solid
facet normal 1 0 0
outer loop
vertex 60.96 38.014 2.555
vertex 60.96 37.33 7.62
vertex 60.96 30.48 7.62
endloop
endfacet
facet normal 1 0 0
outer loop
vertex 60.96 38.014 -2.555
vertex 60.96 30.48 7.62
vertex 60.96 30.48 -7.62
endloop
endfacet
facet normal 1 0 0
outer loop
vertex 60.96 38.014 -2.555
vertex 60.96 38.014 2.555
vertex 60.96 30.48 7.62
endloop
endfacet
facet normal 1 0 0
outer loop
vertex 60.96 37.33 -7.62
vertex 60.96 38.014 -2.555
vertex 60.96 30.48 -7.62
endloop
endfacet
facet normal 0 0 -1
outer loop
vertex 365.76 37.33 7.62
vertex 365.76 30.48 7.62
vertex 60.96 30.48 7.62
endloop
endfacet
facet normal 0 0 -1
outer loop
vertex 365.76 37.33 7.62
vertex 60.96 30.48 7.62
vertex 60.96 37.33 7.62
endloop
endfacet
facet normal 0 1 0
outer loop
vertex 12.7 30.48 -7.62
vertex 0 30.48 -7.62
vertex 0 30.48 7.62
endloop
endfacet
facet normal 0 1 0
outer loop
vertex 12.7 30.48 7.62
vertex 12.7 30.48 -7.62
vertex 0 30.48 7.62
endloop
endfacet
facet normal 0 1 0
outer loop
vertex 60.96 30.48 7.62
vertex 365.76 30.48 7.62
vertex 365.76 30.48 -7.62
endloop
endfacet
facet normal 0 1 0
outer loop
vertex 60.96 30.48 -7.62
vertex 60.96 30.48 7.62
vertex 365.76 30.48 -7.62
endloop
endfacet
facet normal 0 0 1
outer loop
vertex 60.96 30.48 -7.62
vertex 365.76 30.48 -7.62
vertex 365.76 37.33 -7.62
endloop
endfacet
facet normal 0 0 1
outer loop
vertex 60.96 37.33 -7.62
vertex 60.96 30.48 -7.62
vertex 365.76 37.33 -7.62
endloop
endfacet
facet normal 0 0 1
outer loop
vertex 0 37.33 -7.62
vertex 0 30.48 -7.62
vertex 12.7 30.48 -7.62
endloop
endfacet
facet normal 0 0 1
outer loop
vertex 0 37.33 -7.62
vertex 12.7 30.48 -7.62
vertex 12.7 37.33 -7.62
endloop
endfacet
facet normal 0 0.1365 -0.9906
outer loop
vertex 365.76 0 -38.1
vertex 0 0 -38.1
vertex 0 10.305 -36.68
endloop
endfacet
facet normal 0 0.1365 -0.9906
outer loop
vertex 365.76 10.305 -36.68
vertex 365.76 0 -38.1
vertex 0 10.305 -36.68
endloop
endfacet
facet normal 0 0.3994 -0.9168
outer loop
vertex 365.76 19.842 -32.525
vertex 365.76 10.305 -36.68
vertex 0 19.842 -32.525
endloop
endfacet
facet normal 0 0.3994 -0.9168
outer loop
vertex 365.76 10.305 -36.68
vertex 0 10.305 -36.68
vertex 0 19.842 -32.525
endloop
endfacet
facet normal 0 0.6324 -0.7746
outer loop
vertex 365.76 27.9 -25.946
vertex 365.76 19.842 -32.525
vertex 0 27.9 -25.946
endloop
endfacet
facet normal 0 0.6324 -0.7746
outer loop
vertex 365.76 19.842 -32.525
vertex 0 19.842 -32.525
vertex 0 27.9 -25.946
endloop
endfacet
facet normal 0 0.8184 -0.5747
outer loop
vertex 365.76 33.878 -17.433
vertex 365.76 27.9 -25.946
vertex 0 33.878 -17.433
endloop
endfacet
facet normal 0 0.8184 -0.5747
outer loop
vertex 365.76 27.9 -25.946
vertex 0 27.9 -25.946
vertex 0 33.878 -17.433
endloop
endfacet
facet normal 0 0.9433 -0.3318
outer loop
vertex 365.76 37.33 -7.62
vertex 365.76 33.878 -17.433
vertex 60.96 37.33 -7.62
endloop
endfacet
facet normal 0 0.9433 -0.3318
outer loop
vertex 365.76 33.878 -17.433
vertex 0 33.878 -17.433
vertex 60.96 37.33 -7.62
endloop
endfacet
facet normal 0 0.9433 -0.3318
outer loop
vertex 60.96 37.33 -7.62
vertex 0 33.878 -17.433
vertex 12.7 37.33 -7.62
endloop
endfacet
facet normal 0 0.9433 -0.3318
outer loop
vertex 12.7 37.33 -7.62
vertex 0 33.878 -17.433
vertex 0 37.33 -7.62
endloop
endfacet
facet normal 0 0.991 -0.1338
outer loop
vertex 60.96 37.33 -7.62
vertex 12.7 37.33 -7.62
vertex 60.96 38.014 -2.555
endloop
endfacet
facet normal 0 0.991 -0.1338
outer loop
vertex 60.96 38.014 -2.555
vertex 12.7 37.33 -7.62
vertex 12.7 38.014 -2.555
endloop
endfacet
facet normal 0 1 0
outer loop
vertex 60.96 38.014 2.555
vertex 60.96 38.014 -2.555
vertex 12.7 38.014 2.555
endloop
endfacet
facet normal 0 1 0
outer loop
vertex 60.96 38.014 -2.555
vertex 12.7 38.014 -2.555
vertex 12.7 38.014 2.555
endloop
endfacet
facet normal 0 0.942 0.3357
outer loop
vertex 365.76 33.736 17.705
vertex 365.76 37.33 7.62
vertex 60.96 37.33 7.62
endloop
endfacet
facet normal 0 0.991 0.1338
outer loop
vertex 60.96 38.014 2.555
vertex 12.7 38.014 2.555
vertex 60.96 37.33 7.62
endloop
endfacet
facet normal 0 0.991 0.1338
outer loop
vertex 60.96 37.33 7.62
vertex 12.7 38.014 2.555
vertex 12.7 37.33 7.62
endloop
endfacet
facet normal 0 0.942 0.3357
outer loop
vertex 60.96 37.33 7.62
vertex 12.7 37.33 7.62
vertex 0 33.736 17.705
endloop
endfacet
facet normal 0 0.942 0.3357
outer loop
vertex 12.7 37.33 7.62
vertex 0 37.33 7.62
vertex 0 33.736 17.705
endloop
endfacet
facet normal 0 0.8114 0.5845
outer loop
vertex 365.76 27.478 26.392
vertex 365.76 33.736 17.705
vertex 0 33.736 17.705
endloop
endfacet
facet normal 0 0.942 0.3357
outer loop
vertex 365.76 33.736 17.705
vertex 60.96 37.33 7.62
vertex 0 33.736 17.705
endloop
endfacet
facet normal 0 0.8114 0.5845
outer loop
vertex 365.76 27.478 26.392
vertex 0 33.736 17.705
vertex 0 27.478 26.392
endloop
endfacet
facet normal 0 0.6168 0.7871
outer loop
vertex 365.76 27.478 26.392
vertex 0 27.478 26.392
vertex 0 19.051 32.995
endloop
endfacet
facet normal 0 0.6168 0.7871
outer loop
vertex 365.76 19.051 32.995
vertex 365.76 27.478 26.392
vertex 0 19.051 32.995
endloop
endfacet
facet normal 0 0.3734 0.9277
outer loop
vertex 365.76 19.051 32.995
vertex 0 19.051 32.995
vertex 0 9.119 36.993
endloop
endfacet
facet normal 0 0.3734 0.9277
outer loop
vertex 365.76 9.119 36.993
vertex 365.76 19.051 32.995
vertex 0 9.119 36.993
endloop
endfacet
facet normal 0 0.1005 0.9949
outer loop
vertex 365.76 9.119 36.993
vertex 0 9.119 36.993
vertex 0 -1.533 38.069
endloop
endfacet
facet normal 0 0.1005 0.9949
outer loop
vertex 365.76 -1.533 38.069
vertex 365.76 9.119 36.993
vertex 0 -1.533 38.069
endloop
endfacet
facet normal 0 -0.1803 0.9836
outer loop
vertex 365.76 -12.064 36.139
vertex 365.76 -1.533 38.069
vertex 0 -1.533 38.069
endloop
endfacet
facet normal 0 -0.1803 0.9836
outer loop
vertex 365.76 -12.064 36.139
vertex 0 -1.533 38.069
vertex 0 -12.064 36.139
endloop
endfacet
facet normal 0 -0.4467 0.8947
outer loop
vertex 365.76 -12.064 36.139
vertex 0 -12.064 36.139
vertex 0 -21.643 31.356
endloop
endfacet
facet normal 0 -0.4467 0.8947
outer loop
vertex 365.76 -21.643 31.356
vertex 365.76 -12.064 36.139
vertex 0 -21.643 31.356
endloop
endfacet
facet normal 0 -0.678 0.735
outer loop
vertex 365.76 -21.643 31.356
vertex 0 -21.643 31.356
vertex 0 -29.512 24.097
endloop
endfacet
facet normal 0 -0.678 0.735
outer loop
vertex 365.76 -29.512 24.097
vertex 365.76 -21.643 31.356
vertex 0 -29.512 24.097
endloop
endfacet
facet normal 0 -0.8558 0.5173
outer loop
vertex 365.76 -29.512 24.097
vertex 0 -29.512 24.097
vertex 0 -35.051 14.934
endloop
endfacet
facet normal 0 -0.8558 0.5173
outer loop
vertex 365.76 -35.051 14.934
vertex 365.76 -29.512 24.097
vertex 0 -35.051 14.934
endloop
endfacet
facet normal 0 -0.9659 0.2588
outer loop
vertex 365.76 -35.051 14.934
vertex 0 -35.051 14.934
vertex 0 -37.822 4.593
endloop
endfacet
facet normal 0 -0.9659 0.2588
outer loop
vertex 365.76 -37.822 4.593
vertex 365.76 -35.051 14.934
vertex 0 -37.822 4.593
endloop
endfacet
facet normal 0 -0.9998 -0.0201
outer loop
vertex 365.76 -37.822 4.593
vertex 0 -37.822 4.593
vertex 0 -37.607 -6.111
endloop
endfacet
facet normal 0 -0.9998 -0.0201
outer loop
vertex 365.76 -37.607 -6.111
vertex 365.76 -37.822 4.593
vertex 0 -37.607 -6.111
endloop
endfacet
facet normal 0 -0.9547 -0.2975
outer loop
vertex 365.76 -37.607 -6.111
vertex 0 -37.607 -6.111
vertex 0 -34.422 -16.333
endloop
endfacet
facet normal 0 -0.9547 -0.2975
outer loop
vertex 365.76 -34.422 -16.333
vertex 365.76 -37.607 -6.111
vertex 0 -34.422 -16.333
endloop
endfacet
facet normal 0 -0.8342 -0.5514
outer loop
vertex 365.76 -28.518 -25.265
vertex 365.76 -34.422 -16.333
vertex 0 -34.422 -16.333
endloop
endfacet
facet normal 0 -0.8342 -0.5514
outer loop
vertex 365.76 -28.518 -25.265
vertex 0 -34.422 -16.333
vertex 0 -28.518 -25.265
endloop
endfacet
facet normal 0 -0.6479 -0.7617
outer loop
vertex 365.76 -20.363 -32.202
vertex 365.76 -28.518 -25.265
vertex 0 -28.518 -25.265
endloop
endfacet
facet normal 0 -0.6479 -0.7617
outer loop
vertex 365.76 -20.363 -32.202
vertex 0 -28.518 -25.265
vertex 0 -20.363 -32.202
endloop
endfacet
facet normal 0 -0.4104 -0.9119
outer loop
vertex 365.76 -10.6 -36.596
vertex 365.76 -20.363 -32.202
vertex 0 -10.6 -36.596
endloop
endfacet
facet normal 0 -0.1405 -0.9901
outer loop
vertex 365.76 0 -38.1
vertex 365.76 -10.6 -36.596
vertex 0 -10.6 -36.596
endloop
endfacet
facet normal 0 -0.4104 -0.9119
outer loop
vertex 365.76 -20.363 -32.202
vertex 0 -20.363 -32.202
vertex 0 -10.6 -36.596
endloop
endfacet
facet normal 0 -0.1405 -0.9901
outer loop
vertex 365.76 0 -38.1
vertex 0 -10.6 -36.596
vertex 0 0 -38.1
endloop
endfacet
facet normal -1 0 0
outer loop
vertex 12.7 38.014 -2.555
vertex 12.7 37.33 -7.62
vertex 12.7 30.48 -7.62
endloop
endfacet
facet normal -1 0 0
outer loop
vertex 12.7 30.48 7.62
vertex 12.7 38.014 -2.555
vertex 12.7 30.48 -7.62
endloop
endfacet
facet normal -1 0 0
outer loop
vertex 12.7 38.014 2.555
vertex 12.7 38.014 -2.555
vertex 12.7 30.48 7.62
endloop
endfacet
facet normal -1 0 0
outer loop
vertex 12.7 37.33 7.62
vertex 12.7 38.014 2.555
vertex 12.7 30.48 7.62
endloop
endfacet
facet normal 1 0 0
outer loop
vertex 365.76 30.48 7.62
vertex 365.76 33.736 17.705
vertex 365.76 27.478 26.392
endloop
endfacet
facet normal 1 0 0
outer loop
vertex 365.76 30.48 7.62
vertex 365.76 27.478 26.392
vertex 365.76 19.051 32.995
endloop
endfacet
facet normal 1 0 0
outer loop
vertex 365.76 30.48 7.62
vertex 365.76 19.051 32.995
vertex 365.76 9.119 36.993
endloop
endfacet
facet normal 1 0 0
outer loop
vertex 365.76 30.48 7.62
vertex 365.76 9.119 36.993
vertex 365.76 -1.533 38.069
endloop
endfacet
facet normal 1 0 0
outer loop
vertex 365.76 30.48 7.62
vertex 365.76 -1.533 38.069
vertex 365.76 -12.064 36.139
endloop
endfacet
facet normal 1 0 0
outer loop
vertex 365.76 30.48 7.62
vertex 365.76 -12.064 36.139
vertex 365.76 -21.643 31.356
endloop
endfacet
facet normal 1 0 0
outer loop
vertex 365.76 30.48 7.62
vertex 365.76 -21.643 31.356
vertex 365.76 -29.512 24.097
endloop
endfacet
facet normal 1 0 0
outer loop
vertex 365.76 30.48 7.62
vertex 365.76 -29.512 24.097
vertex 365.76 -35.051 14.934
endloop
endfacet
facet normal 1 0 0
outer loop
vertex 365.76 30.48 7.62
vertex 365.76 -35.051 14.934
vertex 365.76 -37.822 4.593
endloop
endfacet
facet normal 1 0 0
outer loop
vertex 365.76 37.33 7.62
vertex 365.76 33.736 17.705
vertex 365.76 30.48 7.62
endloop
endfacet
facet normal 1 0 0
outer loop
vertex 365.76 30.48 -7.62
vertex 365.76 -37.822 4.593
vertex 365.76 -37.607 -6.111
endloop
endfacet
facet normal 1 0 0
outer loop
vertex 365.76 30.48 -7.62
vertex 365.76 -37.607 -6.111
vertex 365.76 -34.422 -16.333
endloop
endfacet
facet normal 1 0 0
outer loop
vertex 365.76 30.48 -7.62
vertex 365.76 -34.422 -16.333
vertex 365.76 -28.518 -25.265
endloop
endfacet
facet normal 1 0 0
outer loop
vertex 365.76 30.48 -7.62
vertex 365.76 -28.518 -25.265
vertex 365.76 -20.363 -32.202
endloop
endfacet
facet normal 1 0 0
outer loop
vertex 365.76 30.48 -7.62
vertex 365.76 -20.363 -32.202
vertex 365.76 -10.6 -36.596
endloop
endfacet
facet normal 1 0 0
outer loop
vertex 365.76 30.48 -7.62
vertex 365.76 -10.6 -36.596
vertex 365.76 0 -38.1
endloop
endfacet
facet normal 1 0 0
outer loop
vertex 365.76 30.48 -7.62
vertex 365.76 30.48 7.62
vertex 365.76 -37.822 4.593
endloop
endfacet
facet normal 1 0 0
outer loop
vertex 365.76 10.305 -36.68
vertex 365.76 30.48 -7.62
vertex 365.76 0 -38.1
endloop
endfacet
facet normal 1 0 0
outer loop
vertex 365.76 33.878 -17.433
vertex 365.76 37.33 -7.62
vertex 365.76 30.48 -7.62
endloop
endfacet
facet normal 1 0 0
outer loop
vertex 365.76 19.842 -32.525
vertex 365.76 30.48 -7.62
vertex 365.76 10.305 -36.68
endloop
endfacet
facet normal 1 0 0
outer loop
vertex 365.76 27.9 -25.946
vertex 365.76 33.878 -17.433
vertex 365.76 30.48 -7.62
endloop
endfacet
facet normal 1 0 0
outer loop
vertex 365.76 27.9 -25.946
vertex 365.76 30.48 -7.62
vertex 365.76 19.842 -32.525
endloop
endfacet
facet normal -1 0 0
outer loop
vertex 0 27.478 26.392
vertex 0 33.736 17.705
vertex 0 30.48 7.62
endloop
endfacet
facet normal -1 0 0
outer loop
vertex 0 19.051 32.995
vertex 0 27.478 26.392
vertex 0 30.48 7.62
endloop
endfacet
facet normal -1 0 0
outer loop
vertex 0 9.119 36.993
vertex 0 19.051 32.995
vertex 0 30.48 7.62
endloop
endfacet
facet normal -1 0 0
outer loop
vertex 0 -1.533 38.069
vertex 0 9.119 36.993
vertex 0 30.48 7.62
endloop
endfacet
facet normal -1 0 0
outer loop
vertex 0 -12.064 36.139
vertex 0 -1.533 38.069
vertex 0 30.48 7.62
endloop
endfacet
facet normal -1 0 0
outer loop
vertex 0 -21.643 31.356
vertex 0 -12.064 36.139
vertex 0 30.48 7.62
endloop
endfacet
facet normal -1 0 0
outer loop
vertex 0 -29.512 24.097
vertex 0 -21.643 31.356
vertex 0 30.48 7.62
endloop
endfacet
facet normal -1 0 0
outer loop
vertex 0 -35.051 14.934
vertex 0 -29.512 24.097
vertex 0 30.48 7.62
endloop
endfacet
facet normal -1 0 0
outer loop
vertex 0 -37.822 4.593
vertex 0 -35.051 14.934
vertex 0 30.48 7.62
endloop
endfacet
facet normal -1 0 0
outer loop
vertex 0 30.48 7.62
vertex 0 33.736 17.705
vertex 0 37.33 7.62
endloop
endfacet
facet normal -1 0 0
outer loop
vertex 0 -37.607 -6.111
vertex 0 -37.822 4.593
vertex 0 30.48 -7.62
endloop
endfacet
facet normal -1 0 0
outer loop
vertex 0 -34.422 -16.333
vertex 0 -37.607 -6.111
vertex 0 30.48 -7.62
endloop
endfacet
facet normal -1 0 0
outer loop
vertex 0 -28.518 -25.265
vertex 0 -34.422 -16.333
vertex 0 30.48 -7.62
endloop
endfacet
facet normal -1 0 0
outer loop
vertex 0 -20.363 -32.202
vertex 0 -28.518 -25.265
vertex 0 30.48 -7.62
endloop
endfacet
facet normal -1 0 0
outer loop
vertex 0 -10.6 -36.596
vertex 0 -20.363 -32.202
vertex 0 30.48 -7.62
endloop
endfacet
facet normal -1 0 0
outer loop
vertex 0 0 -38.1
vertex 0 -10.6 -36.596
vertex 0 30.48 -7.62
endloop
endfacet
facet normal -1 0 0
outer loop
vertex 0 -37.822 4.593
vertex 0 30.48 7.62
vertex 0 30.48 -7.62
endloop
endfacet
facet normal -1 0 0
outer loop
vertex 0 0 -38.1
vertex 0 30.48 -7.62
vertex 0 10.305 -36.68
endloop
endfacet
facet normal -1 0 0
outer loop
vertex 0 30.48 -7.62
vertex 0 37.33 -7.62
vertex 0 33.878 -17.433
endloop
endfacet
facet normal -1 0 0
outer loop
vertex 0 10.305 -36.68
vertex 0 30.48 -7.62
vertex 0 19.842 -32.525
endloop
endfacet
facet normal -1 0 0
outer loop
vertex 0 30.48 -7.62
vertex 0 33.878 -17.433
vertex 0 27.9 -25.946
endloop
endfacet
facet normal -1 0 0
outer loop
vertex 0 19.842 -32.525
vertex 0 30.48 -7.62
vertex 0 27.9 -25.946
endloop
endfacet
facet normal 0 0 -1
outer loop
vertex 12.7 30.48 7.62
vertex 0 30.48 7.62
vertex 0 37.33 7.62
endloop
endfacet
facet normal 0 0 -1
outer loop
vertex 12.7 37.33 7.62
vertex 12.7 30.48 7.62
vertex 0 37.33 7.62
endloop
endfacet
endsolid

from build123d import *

# Parameters (mm, degrees)
SKETCH1_R           = 38.1
BOSS_EXTRUDE1_DEPTH = 365.76
SKETCH2_W           = 15.24
SKETCH2_H           = 15.24
CUT_EXTRUDE1_DEPTH  = 304.8
SKETCH3_W           = 15.24
SKETCH3_H           = 15.24
CUT_EXTRUDE2_DEPTH  = 12.7


with BuildPart() as part:
    # Sketch1 → Boss-Extrude1 (new body)
    with BuildSketch(Plane(origin=(0, 0, 0), x_dir=(0, 0, -1), z_dir=(1, 0, 0))):
        Circle(SKETCH1_R)
    extrude(amount=BOSS_EXTRUDE1_DEPTH)

    # Sketch2 → Cut-Extrude1 (cut)
    with BuildSketch(Plane(origin=(365.76, 0, 0), x_dir=(0, 0, -1), z_dir=(1, 0, 0))):
        with Locations((0, 38.1)):
            Rectangle(SKETCH2_W, SKETCH2_H)
    extrude(amount=-CUT_EXTRUDE1_DEPTH, mode=Mode.SUBTRACT)

    # Sketch3 → Cut-Extrude2 (cut)
    with BuildSketch(Plane.ZY):
        with Locations((0, 38.1)):
            Rectangle(SKETCH3_W, SKETCH3_H)
    extrude(amount=-CUT_EXTRUDE2_DEPTH, mode=Mode.SUBTRACT)


solid = part.part
